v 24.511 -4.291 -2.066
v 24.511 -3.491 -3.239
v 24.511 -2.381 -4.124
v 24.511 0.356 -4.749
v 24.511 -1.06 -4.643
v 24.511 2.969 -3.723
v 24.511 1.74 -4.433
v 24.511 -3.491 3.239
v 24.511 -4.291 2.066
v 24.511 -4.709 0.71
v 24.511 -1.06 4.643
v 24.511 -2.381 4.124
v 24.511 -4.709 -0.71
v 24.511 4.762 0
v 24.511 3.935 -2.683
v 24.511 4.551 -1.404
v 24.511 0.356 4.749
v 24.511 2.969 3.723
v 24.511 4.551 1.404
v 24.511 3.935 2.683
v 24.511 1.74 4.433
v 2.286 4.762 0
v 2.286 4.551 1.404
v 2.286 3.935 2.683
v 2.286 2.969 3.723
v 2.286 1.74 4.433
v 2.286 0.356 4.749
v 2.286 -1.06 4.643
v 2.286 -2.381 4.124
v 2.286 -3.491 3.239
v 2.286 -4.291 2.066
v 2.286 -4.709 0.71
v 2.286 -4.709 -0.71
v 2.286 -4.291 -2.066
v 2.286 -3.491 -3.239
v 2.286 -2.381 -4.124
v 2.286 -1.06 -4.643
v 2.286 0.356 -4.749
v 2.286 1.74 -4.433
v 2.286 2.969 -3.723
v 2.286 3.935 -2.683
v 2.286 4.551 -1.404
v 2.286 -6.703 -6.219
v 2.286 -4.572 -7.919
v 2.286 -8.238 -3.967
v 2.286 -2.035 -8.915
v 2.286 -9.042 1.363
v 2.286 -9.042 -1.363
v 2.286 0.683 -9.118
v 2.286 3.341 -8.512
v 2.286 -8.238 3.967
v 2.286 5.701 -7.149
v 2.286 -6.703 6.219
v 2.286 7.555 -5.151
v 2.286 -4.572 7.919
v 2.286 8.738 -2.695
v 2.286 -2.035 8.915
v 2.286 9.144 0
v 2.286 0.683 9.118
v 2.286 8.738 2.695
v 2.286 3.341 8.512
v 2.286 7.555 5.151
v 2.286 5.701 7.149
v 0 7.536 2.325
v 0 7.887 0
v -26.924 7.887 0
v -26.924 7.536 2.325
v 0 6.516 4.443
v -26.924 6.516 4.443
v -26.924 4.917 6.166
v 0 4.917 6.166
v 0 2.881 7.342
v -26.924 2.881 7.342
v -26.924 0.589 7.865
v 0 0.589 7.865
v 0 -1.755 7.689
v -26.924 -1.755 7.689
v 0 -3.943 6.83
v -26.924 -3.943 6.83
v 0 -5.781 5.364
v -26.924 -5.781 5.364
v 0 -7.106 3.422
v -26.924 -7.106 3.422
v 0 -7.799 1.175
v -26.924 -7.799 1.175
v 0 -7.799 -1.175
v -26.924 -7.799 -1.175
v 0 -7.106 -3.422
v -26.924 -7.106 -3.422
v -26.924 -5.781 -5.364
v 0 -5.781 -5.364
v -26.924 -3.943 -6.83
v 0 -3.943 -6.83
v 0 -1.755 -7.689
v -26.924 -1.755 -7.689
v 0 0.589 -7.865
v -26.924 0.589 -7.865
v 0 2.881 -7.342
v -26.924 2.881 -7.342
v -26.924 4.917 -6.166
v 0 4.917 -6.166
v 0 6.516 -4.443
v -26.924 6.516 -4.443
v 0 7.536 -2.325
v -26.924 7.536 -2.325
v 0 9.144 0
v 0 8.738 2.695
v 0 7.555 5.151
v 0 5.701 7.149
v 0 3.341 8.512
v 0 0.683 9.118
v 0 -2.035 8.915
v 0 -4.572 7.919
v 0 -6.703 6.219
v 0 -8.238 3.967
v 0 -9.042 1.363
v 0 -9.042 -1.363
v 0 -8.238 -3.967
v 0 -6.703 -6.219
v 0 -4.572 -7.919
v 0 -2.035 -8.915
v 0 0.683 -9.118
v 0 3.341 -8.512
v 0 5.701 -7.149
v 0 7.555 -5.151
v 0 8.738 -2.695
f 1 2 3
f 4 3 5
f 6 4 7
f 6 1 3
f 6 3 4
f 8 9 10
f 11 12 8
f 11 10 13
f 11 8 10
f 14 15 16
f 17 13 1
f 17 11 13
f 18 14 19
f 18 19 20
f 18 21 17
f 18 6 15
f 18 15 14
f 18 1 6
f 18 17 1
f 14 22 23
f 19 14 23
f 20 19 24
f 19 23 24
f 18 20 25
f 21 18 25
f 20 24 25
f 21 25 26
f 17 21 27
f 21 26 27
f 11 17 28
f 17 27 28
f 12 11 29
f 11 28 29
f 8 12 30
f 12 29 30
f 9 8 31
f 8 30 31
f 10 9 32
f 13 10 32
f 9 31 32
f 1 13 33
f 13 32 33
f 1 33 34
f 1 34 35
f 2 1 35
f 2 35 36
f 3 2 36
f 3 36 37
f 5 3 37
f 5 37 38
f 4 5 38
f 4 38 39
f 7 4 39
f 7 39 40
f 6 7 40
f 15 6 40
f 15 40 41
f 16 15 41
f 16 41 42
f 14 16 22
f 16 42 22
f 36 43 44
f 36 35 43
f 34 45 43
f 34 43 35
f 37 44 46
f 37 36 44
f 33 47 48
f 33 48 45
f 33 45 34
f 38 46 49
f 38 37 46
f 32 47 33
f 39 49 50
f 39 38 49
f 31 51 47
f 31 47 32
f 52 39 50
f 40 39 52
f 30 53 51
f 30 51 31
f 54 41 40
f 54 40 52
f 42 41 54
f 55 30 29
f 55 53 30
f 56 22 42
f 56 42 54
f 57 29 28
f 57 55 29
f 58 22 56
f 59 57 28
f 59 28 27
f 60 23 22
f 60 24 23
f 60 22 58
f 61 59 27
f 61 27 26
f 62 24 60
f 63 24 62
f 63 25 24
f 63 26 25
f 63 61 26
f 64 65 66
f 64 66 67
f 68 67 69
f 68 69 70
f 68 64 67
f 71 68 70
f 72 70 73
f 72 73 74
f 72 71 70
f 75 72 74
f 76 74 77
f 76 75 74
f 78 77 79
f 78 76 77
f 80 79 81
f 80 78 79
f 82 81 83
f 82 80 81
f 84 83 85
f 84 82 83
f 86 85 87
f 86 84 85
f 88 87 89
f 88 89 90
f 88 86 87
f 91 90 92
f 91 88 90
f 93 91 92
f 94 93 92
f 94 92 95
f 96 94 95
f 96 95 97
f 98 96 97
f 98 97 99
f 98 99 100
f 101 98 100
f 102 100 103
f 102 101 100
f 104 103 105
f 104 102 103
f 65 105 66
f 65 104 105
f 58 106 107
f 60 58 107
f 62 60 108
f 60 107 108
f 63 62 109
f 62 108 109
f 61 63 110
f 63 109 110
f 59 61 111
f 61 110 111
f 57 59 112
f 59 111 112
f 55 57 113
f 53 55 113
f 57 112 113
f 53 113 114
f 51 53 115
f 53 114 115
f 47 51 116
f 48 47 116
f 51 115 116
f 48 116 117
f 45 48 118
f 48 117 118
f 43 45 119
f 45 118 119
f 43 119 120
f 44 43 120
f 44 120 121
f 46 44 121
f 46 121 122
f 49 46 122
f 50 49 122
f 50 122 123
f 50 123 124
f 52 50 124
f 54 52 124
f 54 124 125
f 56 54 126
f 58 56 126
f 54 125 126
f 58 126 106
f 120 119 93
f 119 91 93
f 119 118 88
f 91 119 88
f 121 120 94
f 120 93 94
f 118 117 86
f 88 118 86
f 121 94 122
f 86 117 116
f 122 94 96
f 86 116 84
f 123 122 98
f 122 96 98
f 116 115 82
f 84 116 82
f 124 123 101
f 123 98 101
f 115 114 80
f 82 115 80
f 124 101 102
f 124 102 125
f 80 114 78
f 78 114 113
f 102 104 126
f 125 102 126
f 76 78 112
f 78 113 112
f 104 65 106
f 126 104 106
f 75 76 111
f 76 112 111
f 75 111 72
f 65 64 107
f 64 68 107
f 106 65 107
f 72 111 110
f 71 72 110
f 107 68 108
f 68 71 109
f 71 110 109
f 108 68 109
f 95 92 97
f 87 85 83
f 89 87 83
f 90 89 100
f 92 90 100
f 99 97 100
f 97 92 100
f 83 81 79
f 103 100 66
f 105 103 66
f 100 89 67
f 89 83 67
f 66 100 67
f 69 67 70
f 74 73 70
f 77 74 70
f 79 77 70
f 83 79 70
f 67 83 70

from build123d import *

# Parameters (mm, degrees)
F0_R     = 7.8867
F1_DEPTH = 26.924
F0_R_2   = 9.144
F2_DEPTH = 2.286
F3_R     = 4.7625
F4_DEPTH = 22.225


# Not quite as in the source:
# - a length typed as a fraction of an inch, garbled in the dataset ("3 / 203.2 mm" for 3/8 in), is restored


with BuildPart() as f1:
    # F0 (on Right) → F1 (new body)
    with BuildSketch(Plane.YZ):
        Circle(F0_R)
    extrude(amount=-F1_DEPTH)

    # F0 (on Right) → F2 (join)
    with BuildSketch(Plane.YZ):
        Circle(F0_R_2)
        Circle(F0_R, mode=Mode.SUBTRACT)
        Circle(F0_R)
    extrude(amount=F2_DEPTH)

    # F3 (on face) → F4 (join)
    with BuildSketch(Plane.YZ.offset(2.286)):
        Circle(F3_R)
    extrude(amount=F4_DEPTH)


solid = f1.part
